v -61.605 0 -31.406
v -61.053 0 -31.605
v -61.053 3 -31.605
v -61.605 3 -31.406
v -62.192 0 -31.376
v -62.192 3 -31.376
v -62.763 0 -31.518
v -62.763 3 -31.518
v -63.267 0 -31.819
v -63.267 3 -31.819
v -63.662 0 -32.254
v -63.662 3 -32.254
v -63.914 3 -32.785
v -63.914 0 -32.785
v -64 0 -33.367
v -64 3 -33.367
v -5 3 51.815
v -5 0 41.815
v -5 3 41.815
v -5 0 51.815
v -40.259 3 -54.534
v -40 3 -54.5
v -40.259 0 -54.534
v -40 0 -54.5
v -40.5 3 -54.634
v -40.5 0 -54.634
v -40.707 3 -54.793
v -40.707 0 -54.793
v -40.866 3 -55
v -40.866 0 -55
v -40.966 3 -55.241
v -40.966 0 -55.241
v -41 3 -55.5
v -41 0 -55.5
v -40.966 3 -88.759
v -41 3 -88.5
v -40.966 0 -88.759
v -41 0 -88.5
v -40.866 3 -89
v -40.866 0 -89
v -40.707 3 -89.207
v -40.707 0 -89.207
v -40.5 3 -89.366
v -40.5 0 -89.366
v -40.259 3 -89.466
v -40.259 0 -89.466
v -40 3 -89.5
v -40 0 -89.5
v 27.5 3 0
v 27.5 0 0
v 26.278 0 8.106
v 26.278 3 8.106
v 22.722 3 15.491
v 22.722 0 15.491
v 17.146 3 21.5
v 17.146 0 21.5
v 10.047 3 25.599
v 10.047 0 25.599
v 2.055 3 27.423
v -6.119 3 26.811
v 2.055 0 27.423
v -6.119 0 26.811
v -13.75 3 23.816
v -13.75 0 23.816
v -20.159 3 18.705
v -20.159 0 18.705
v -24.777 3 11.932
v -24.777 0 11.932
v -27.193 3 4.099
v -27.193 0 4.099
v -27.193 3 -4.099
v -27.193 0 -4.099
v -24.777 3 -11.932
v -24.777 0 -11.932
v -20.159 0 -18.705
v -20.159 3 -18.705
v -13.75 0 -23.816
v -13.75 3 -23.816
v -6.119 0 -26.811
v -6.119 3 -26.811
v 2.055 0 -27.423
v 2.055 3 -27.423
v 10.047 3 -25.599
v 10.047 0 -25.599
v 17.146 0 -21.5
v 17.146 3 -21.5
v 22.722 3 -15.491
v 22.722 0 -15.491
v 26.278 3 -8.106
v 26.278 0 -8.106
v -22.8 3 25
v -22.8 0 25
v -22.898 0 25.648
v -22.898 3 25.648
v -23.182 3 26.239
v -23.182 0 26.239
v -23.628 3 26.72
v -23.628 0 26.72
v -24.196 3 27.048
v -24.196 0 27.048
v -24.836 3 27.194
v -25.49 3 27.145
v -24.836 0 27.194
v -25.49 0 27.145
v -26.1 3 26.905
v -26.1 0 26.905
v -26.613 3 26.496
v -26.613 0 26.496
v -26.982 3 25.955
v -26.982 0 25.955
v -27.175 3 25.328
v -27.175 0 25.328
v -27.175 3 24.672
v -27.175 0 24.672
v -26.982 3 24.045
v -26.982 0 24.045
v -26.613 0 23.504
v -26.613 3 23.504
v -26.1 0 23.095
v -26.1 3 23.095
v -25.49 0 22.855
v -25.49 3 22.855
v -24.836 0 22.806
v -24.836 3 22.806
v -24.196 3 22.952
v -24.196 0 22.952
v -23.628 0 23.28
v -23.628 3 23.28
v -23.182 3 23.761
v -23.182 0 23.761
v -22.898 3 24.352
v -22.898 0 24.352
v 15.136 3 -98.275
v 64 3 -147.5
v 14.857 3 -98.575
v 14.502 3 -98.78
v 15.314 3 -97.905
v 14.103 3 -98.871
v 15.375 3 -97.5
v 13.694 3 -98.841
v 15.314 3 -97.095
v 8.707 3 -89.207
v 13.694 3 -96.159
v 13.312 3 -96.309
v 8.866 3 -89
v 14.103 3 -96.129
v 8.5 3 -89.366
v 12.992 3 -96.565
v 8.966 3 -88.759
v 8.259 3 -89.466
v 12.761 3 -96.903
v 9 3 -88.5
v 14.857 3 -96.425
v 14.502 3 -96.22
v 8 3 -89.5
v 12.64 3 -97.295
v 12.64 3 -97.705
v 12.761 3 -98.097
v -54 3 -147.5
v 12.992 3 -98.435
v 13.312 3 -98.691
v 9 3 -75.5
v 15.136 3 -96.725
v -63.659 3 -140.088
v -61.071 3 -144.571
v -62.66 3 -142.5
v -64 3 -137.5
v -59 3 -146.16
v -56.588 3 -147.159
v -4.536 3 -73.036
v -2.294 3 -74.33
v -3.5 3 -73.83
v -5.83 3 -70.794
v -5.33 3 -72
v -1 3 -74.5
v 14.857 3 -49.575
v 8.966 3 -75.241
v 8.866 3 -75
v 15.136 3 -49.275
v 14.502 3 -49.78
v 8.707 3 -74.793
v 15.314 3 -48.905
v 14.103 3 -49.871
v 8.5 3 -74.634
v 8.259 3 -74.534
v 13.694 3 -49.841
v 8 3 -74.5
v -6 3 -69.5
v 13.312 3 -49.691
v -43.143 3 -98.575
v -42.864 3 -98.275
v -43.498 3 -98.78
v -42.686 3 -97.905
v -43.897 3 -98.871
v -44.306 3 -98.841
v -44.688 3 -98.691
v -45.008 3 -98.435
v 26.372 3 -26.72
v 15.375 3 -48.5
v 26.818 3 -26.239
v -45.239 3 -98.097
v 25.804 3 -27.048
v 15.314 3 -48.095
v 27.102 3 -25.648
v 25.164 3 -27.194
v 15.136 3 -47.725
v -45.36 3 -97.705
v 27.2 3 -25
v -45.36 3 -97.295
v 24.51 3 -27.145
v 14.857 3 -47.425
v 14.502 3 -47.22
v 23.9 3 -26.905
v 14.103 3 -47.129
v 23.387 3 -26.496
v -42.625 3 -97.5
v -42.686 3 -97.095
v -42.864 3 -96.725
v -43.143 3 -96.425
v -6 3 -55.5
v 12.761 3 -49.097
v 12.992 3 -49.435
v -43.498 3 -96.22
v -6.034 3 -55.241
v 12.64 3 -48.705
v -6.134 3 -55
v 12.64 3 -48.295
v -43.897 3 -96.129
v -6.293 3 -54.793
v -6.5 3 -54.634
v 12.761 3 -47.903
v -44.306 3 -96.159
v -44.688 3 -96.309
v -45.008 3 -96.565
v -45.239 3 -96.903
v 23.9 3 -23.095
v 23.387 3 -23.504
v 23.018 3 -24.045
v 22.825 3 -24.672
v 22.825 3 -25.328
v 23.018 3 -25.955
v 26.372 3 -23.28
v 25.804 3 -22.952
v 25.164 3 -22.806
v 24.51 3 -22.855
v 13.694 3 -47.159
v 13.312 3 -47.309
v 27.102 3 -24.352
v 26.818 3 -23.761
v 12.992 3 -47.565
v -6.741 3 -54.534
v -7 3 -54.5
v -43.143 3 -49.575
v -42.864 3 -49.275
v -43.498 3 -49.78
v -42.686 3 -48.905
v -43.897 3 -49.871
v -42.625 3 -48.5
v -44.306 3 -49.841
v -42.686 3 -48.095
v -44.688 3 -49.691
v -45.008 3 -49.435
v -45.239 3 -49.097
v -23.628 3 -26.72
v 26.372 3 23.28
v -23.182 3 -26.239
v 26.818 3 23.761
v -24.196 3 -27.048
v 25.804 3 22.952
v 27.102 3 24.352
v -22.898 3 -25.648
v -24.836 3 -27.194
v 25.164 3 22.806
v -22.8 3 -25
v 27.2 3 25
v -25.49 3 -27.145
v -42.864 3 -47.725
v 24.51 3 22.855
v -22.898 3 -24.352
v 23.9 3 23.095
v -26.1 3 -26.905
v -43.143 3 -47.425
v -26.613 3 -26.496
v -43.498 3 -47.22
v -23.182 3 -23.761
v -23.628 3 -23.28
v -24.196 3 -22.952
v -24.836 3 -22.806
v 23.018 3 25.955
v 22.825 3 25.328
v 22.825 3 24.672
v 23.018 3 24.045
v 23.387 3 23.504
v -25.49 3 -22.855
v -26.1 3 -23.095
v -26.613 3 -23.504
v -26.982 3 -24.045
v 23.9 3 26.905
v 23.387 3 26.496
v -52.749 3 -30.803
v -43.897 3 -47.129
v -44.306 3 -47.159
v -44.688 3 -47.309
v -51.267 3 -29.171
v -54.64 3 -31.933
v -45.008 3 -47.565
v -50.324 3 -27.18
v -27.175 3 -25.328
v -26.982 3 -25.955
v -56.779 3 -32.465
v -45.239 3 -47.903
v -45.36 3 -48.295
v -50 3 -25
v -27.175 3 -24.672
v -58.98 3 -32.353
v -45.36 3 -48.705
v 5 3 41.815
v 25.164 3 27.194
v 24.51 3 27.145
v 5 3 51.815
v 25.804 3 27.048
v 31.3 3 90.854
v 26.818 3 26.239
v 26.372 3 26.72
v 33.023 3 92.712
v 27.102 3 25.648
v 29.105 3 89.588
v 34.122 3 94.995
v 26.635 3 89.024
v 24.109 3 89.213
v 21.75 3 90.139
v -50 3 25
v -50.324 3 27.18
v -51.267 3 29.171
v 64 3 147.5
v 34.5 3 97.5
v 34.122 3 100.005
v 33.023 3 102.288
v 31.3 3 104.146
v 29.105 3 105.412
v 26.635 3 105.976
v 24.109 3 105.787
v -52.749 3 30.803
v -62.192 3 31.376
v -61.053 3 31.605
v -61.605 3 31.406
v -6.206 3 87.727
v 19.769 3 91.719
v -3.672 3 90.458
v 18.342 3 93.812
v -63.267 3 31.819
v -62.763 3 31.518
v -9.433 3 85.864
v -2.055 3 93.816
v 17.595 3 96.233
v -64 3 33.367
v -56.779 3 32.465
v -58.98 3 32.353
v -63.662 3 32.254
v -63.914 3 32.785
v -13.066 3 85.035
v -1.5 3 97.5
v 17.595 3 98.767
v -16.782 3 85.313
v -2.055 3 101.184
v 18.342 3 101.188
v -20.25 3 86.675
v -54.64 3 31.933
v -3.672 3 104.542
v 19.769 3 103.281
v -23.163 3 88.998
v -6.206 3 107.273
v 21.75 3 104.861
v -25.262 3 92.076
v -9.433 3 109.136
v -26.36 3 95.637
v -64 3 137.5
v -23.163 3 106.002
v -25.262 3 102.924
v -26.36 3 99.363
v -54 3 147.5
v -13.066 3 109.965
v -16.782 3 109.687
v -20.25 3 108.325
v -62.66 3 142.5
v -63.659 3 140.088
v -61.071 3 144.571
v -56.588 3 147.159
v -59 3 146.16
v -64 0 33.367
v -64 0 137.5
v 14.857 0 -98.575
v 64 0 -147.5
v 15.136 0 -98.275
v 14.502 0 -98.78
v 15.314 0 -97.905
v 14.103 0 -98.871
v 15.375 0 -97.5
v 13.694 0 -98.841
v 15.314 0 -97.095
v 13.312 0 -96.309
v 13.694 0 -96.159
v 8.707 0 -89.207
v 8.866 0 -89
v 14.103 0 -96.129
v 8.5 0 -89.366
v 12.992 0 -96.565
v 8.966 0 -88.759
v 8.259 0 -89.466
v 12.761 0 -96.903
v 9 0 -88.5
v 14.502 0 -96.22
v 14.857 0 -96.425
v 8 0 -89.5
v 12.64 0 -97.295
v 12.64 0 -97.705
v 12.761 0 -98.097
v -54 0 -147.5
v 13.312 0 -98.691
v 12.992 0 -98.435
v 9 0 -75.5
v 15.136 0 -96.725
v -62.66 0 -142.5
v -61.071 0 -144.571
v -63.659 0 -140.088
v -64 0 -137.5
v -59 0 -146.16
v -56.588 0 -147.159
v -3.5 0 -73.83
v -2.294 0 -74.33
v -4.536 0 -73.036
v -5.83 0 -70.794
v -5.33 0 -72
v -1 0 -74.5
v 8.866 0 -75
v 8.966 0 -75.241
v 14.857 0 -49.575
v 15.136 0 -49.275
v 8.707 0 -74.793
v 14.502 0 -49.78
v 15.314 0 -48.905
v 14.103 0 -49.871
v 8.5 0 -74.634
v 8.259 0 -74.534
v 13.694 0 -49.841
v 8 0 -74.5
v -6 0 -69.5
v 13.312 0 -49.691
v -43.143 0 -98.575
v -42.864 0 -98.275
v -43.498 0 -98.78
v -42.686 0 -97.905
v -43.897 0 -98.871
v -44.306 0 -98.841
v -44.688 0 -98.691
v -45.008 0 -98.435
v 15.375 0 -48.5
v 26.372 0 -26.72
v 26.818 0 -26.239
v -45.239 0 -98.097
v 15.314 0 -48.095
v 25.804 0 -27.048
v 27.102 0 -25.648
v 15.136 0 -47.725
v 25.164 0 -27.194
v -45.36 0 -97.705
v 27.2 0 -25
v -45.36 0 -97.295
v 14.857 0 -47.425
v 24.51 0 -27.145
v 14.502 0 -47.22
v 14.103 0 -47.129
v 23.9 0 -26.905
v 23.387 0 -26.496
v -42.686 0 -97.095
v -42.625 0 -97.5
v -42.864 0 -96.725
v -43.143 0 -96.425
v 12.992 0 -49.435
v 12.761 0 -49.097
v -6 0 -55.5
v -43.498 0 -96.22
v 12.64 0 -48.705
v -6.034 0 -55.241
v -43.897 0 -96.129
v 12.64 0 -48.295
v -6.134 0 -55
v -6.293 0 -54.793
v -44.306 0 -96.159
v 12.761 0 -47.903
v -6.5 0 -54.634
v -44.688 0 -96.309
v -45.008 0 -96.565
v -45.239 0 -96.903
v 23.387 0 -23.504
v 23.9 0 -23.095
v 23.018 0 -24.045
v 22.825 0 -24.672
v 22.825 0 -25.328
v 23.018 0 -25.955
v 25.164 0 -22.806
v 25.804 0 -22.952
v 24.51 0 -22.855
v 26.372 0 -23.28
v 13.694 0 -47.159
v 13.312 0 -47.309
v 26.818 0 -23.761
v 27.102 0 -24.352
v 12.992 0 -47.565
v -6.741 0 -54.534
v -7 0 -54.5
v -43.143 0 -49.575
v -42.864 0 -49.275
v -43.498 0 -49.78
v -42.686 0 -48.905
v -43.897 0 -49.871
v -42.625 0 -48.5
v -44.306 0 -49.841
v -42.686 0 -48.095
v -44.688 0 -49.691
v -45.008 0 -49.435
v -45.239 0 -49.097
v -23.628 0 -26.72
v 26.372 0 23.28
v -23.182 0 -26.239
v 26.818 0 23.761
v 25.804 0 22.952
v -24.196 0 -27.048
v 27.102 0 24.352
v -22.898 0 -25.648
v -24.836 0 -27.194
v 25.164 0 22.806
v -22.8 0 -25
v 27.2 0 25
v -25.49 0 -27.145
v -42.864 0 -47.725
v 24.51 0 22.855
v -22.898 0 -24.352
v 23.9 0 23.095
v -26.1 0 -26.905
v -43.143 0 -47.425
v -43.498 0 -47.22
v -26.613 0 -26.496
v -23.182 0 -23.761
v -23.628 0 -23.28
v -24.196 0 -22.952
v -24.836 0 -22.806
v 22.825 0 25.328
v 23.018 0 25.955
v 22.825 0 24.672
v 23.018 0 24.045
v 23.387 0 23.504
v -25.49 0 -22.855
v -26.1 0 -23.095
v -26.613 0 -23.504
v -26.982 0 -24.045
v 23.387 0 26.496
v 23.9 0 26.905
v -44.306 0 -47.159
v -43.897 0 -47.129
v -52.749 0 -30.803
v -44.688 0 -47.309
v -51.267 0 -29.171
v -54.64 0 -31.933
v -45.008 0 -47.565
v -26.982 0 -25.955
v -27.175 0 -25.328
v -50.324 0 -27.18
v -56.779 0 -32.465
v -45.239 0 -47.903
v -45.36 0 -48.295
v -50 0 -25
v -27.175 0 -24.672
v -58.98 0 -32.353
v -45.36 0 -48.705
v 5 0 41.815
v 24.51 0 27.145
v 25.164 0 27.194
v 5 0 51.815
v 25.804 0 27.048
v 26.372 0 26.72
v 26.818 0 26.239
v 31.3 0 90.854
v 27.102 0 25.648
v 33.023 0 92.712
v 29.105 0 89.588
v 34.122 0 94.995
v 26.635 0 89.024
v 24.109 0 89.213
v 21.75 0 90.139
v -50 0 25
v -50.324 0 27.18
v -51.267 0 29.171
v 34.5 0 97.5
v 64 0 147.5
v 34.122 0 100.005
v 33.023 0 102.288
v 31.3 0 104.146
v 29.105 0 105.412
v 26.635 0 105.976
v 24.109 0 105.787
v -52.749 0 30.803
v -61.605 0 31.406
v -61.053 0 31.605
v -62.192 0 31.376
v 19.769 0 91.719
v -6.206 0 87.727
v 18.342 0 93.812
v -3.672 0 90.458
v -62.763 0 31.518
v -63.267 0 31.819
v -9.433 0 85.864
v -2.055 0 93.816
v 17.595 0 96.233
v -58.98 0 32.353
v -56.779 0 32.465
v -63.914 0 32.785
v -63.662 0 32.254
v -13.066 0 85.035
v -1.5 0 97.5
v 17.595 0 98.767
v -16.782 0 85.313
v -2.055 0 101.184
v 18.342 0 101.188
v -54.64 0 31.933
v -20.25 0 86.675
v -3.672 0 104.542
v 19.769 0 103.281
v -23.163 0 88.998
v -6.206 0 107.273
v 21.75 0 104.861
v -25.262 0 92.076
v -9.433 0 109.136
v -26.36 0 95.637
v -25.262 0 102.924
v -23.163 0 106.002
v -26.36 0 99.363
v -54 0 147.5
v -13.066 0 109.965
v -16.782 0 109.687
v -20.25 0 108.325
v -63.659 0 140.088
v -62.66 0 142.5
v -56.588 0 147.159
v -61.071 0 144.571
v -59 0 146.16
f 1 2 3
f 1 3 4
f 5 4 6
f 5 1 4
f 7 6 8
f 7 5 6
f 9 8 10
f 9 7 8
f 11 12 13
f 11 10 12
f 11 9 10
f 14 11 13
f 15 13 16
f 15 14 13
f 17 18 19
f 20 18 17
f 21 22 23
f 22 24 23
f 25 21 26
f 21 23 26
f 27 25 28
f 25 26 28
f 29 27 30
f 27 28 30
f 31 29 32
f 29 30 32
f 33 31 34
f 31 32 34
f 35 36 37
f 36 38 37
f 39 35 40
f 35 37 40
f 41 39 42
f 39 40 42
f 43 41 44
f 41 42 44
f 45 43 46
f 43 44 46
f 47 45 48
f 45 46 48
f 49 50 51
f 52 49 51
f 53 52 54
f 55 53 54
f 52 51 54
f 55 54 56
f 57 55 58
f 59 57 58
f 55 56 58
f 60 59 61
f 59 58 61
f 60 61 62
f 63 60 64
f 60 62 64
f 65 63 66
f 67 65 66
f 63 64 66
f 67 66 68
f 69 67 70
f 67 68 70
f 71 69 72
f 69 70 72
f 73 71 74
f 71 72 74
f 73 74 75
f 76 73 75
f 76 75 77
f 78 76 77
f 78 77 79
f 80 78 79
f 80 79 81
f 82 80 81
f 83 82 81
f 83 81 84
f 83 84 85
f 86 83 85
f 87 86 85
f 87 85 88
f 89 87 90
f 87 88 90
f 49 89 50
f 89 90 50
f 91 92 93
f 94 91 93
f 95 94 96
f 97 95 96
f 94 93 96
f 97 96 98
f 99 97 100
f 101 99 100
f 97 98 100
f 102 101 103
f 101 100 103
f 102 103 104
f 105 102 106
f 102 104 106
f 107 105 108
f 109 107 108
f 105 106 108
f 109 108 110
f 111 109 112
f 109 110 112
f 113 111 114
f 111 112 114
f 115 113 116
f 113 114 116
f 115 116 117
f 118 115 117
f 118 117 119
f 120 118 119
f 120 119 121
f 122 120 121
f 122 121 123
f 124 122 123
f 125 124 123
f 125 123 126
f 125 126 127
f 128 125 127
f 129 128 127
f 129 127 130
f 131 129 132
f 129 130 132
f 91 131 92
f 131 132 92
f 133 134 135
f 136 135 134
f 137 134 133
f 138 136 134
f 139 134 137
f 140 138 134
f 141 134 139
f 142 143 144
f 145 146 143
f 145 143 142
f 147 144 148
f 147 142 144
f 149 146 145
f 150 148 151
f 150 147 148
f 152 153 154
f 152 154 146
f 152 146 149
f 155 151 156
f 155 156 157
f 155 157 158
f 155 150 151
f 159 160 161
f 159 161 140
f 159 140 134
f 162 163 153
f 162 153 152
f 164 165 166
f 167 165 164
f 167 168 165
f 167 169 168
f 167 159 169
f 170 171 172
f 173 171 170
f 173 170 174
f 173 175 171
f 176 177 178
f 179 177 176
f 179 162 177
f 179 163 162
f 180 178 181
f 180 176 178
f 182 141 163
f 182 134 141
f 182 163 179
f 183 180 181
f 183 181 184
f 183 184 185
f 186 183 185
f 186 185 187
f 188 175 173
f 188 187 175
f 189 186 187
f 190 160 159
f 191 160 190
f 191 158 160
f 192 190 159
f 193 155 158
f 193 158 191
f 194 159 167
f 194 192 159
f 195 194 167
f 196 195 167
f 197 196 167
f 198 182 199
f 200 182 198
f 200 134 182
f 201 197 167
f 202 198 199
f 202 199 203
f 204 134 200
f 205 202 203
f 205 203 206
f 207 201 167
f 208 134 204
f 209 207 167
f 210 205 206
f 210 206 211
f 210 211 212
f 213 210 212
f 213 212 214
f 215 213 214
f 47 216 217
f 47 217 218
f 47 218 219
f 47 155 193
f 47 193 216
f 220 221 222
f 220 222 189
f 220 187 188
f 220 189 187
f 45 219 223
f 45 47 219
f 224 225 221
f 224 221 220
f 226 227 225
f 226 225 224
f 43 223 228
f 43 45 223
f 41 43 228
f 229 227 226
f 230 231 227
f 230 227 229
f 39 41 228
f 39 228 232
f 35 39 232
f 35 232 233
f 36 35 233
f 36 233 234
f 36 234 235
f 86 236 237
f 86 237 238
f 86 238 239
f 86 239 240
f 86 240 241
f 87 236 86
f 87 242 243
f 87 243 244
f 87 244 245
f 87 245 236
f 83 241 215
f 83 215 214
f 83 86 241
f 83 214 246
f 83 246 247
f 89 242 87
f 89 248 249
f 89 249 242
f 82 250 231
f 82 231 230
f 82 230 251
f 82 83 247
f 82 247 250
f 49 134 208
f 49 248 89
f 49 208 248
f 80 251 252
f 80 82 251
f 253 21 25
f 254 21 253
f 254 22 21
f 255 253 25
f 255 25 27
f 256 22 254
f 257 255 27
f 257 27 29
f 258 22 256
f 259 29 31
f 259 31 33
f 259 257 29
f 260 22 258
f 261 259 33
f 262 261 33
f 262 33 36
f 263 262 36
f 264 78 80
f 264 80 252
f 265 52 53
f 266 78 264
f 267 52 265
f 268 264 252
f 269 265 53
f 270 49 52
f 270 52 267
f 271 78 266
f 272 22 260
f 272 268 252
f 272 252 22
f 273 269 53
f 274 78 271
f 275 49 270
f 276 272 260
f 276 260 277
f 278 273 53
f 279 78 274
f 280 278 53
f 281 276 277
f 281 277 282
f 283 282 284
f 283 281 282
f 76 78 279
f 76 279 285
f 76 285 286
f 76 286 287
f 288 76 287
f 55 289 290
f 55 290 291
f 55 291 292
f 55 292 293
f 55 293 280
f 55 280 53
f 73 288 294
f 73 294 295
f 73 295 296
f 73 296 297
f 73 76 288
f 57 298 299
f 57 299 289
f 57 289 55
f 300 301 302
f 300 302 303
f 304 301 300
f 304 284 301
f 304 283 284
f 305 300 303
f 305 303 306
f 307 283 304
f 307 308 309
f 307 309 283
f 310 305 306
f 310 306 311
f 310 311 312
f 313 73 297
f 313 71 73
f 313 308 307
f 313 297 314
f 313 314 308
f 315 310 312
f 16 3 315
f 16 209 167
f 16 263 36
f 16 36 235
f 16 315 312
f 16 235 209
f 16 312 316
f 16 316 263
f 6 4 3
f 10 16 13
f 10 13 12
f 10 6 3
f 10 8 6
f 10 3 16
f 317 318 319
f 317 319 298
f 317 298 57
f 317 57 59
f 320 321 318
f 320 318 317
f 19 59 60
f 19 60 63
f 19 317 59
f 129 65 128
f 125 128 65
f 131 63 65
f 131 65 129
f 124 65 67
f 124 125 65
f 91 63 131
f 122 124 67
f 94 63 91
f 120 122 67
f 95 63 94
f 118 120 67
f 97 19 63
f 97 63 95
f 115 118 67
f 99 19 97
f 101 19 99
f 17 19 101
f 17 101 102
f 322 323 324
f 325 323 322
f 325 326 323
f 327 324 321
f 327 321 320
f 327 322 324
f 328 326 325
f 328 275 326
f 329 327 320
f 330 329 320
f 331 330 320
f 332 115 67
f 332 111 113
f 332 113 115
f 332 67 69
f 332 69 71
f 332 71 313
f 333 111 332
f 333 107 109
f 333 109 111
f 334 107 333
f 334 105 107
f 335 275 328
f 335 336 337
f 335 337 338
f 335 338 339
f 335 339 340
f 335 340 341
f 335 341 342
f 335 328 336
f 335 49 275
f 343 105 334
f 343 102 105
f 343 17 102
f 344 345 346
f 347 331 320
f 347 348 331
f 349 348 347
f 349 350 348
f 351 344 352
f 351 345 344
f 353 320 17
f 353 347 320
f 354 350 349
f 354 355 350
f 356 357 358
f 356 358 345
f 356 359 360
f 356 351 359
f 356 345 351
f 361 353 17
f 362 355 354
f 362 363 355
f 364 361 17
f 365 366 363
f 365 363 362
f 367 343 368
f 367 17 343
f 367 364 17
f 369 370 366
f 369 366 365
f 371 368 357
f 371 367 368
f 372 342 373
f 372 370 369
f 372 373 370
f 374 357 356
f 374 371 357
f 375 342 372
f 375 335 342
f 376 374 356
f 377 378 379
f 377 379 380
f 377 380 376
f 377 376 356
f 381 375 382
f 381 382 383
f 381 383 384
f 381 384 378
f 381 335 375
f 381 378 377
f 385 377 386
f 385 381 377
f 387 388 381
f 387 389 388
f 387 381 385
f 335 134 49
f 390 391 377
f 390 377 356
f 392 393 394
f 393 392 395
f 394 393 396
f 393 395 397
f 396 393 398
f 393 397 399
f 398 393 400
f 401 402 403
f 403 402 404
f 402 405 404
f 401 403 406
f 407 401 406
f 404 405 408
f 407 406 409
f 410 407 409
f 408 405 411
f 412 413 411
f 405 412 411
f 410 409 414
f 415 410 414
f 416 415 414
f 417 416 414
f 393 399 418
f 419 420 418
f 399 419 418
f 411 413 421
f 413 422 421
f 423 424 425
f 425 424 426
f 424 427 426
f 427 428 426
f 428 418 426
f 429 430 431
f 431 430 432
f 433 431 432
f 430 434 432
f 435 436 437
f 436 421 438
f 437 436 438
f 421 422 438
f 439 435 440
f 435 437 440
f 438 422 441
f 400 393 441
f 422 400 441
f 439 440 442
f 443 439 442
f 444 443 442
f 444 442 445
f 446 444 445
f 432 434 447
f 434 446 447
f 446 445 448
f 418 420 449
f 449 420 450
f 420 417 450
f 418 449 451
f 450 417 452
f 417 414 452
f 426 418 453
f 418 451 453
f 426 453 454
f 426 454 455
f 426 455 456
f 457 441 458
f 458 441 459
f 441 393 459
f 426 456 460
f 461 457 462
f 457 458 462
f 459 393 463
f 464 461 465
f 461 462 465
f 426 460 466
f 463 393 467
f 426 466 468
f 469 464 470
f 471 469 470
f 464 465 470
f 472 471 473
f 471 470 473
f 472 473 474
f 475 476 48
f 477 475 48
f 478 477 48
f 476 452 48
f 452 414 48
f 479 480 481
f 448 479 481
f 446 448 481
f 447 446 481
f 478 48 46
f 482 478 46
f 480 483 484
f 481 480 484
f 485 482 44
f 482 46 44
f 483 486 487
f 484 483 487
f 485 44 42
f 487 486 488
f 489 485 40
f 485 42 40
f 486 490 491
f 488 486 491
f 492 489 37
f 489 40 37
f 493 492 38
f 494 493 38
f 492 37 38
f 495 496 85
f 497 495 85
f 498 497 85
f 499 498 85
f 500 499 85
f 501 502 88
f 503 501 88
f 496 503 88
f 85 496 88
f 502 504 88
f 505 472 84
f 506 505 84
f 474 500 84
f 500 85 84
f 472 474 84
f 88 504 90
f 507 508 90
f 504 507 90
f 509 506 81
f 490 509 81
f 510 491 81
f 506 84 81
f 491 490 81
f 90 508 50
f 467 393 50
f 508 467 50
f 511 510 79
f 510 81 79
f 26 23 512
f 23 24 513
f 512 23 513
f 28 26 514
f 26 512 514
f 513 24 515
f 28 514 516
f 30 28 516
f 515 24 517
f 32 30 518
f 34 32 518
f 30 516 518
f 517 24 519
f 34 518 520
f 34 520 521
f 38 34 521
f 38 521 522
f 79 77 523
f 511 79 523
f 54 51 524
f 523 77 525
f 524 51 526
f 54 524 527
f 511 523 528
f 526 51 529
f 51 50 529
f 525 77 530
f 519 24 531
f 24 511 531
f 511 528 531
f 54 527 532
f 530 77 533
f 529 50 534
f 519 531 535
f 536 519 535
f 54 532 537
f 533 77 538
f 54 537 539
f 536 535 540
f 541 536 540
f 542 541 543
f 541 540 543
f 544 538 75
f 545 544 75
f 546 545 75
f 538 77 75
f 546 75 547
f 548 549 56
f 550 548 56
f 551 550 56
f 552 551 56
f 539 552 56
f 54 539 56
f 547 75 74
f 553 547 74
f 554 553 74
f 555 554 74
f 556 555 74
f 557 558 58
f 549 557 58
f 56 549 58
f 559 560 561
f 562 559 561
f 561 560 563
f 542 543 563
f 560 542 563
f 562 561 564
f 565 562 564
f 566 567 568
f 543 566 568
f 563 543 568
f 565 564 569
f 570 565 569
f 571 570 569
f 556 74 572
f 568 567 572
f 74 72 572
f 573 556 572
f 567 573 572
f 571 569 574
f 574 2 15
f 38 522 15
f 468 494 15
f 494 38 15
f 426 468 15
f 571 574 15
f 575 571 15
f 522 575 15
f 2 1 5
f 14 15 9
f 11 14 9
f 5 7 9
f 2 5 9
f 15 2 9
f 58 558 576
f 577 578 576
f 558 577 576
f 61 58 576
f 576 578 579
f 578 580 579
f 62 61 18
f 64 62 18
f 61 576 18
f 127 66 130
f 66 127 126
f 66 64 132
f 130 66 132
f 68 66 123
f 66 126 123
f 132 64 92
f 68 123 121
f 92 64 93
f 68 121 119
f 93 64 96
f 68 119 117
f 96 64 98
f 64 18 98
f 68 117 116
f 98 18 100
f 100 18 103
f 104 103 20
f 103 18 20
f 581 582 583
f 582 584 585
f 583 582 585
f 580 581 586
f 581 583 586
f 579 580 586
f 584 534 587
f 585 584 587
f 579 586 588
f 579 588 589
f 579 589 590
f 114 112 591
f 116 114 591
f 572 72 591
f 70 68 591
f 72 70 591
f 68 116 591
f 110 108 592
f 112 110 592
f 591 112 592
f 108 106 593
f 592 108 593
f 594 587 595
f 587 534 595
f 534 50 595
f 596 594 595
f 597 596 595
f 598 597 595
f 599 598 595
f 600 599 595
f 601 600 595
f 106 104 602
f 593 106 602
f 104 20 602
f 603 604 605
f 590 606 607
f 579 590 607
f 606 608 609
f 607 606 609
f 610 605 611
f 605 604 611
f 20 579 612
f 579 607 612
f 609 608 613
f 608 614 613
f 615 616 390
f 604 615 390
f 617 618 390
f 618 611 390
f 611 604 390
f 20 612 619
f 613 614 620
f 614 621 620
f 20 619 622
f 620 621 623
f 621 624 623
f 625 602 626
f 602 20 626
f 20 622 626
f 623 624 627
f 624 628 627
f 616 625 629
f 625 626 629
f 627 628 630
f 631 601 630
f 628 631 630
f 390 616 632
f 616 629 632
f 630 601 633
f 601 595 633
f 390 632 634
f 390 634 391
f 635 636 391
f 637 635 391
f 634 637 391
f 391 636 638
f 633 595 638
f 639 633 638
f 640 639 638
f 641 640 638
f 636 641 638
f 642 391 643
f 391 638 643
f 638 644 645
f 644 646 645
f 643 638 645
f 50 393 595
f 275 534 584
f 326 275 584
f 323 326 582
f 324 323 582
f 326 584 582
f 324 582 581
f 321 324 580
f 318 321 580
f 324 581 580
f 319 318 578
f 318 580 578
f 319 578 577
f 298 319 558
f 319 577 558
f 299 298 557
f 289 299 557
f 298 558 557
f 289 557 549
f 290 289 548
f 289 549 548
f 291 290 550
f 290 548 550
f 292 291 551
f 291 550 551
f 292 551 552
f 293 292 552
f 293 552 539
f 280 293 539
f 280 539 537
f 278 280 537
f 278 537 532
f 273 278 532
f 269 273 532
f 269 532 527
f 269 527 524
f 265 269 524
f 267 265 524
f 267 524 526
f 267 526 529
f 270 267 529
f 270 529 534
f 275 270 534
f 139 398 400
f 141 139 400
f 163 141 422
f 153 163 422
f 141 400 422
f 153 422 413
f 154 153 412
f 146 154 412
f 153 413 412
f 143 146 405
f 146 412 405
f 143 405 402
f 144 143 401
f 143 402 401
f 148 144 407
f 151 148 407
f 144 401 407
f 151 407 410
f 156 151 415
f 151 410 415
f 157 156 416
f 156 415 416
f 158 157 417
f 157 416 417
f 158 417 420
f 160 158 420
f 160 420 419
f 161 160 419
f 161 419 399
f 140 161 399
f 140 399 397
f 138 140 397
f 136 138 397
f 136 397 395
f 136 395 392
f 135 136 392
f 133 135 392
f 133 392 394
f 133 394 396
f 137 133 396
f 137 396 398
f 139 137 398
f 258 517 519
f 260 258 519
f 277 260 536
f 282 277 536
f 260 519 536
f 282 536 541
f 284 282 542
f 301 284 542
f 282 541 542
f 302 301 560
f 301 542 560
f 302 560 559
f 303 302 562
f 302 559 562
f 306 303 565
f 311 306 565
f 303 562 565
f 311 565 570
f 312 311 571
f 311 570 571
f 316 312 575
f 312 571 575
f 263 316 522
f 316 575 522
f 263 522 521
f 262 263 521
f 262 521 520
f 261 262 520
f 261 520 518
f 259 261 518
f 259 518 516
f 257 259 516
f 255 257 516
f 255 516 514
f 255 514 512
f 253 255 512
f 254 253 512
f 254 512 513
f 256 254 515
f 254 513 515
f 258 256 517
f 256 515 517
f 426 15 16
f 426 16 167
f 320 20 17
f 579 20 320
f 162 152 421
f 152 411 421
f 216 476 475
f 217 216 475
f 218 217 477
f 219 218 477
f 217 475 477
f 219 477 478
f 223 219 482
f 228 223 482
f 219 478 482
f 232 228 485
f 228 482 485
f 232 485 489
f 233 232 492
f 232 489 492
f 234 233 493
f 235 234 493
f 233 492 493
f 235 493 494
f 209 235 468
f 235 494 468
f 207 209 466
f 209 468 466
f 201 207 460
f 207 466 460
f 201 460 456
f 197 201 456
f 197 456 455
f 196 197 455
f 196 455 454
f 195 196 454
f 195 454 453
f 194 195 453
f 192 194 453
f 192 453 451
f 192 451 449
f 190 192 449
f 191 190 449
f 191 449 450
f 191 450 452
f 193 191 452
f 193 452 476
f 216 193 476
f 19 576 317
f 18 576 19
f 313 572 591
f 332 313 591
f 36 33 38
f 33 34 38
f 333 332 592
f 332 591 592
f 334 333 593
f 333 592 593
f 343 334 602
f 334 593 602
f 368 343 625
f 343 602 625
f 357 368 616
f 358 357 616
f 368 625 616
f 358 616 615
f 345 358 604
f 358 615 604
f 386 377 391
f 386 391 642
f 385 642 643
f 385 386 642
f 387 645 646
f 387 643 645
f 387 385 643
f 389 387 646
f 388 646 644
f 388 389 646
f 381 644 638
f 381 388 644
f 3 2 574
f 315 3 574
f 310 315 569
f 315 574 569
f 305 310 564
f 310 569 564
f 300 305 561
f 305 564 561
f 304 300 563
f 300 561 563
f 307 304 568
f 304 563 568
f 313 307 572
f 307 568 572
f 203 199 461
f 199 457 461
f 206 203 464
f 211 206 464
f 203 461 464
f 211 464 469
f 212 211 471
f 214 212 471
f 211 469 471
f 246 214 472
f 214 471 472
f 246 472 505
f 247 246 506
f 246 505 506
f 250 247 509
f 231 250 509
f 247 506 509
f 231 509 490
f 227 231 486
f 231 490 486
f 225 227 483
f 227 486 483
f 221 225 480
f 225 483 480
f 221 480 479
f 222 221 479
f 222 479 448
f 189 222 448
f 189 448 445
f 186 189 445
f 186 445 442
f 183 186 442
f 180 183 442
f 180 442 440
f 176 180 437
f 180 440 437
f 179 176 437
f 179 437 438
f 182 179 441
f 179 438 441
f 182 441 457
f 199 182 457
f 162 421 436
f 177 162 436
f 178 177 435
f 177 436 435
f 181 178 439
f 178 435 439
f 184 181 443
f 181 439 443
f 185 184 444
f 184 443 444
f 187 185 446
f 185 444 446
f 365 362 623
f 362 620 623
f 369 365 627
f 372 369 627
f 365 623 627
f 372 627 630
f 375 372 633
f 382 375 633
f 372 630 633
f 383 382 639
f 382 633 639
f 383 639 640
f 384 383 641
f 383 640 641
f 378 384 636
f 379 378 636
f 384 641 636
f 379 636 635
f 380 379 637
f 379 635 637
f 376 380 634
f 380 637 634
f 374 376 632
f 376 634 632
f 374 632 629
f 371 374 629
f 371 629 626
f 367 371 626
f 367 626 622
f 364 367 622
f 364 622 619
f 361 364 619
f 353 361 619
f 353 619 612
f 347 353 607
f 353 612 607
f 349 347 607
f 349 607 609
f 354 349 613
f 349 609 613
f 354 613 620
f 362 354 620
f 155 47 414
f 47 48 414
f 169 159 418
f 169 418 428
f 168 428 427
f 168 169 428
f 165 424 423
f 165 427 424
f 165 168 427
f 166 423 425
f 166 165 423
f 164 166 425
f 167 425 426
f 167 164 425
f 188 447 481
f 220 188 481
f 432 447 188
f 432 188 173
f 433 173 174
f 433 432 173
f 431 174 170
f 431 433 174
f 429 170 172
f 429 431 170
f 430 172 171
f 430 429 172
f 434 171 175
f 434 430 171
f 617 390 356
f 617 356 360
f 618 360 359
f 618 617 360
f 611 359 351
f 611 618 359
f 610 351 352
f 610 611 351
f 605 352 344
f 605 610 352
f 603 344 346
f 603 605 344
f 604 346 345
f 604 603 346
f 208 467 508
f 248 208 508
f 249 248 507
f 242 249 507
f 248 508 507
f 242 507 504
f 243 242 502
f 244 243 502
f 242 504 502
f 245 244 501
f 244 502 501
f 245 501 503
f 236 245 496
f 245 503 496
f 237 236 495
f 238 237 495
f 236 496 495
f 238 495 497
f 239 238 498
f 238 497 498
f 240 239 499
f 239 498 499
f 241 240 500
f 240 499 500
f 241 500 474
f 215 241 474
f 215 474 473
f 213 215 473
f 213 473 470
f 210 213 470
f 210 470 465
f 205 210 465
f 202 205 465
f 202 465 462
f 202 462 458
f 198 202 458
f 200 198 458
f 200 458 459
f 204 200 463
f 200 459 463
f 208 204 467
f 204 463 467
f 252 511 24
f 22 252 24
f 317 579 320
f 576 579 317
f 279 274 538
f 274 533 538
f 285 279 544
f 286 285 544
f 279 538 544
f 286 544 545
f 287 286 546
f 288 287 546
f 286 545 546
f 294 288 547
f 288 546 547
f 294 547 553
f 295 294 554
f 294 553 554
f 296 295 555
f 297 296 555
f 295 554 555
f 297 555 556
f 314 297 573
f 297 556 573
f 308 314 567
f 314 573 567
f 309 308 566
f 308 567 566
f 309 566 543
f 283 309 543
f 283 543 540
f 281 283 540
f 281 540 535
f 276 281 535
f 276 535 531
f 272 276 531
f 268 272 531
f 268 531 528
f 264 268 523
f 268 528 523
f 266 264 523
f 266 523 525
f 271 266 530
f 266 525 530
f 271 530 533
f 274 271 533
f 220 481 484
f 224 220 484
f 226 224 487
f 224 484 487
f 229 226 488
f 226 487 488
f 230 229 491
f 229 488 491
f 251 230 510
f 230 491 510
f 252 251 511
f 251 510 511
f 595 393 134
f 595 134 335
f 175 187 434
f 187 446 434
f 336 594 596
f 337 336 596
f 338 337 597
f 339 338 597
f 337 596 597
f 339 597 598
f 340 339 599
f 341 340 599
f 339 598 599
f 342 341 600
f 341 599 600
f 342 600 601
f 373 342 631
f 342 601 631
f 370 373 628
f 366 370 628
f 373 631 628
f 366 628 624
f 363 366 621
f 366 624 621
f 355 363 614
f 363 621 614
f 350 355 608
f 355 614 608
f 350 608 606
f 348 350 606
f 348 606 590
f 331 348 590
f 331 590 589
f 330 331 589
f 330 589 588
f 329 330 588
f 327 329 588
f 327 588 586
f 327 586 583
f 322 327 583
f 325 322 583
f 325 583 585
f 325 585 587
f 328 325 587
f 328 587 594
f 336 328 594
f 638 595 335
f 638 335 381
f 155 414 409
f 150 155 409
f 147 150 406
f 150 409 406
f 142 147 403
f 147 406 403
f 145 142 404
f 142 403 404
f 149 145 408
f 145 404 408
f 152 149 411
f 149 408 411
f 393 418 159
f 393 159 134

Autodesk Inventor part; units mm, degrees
ref_plane "YZ Plane" through (0, 0, 0) normal (1, 0, 0) x (0, 1, 0)
ref_plane "XZ Plane" through (0, 0, 0) normal (0, 1, 0) x (-1, 0, 0)
ref_plane "XY Plane" through (0, 0, 0) normal (0, 0, 1) x (1, 0, 0)
sketch "Sketch1" plane through (0, 0, 0) normal (0, 1, 0) x (-1, 0, 0)
  line L0 (64, -147.5) -> (-64, -147.5)
  line L1 (-64, -147.5) -> (-64, 147.5)
  line L2 (-64, 147.5) -> (64, 147.5)
  line L3 (64, 147.5) -> (64, -147.5)
  line L4 (64, -147.5) -> (-64, 147.5) construction
  line L5 (-64, -147.5) -> (64, 147.5) construction
  point P0 (0, 0)
  dimension "d0" = 128
  dimension "d1" = 295
extrude "Extrusion1" add sketch "Sketch1" along normal blind 3
sketch "Sketch2" plane through (0, 0, 0) normal (0, -1, 0) x (1, 0, 0)
  line L0 (-57.5, 25) -> (-57.5, -25) construction
  line L1 (-65, 25) -> (-65, -25)
  line L2 (-50, -25) -> (-50, 25)
  arc A0 (-50, 25) -> (-65, 25) centre (-57.5, 25) ccw
  arc A1 (-65, -25) -> (-50, -25) centre (-57.5, -25) ccw
  line L3 (-57.5, 0) -> (-7.5, 0) construction
  point P0 (0, 0)
  dimension "d4" = 25
  dimension "d5" = 90
  dimension "d6" = 15
  dimension "d7" = 50
extrude "Extrusion2" cut sketch "Sketch2" against normal blind 3
sketch "Sketch3" plane through (0, 0, 0) normal (0, -1, 0) x (1, 0, 0)
  line L0 (30, -30) -> (-30, -30)
  line L1 (-30, -30) -> (-30, 30)
  line L2 (-30, 30) -> (30, 30)
  line L3 (30, 30) -> (30, -30)
  line L4 (30, -30) -> (-30, 30) construction
  line L5 (-30, -30) -> (30, 30) construction
  circle A0 centre (-25, -25) radius 2.2
  circle A1 centre (-25, 25) radius 2.2
  circle A2 centre (25, 25) radius 2.2
  circle A3 centre (25, -25) radius 2.2
  circle A4 centre (0, 0) radius 27.5
  dimension "d10" = 60
  dimension "d11" = 60
  dimension "d12" = 4.4
  dimension "d13" = 5
  dimension "d14" = 4.4
  dimension "d15" = 4.4
  dimension "d16" = 4.4
  dimension "d17" = 5
  dimension "d18" = 5
  dimension "d19" = 5
  dimension "d20" = 55
extrude "Extrusion3" cut sketch "Sketch3" against normal blind 3 contours A0 | A1 | A2 | A3 | A4
sketch "Sketch5" plane through (0, 0, 0) normal (0, -1, 0) x (1, 0, 0)
  circle A0 centre (14, -97.5) radius 1.375
  circle A1 centre (-44, -97.5) radius 1.375
  circle A2 centre (-44, -48.5) radius 1.375
  circle A3 centre (14, -48.5) radius 1.375
  line L0 (-64, 147.5) -> (-64, -147.5) projected
  line L1 (-64, -147.5) -> (64, -147.5) projected
  point P0 (0, 0)
  dimension "d23" = 2.75
  dimension "d24" = 2.75
  dimension "d25" = 2.75
  dimension "d26" = 2.75
  dimension "d27" = 58
  dimension "d28" = 58
  dimension "d29" = 49
  dimension "d30" = 20
  dimension "d31" = 50
  dimension "d32" = 50
  dimension "d33" = 20
  dimension "d36" = 49
extrude "Extrusion4" cut sketch "Sketch5" against normal blind 3
sketch "Sketch6" plane through (0, 0, 0) normal (0, -1, 0) x (1, 0, 0)
  line L0 (-40, -89.5) -> (-6, -89.5)
  line L1 (-6, -69.5) -> (-6, -55.5)
  line L2 (-7, -54.5) -> (-40, -54.5)
  line L3 (-41, -55.5) -> (-41, -88.5)
  circle A0 centre (-44, -97.5) radius 1.375 projected
  circle A1 centre (-44, -48.5) radius 1.375 projected
  line L4 (-6, -89.5) -> (8, -89.5)
  line L5 (9, -88.5) -> (9, -75.5)
  line L6 (8, -74.5) -> (-1, -74.5)
  line L7 (-6, -74.5) -> (-6, -89.5)
  arc A2 (-6, -69.5) -> (-1, -74.5) centre (-1, -69.5) ccw
  arc A3 (9, -75.5) -> (8, -74.5) centre (8, -75.5) ccw
  arc A4 (8, -89.5) -> (9, -88.5) centre (8, -88.5) ccw
  arc A5 (-41, -88.5) -> (-40, -89.5) centre (-40, -88.5) ccw
  arc A6 (-40, -54.5) -> (-41, -55.5) centre (-40, -55.5) ccw
  arc A7 (-6, -55.5) -> (-7, -54.5) centre (-7, -55.5) ccw
  point P0 (0, 0)
  point P1 (9, -74.5)
  point P2 (9, -89.5)
  dimension "d39" = 3
  dimension "d43" = 6
  dimension "d58" = 15
  dimension "d59" = 15
  dimension "d60" = 5
  dimension "d61" = 1
extrude "Extrusion5" cut sketch "Sketch6" against normal blind 3 contours A5 L3 A6 L2 A7 L1 A2 L6 A3 L5 A4 L4 L0
sketch "Sketch8" plane through (0, 0, 0) normal (0, -1, 0) x (1, 0, 0)
  circle A0 centre (-14, 97.5) radius 12.5
  line L0 (64, 147.5) -> (-64, 147.5) projected
  line L1 (-64, 147.5) -> (-64, 28.7417) projected
  circle A1 centre (26, 97.5) radius 8.5
  point P0 (0, 0)
  dimension "d44" = 25
  dimension "d45" = 50
  dimension "d46" = 50
  dimension "d49" = 17
  dimension "d50" = 50
  dimension "d51" = 40
extrude "Extrusion6" cut sketch "Sketch8" against normal blind 3
fillet "Fillet1" radius 2 2 edges at (-64, 1.5, 28.7417) (-64, 1.5, -28.7417)
sketch "Sketch9" plane through (0, 0, 0) normal (0, -1, 0) x (1, 0, 0)
  line L0 (-5, 51.815) -> (5, 51.815)
  line L1 (5, 51.815) -> (5, 41.815)
  line L2 (5, 41.815) -> (-5, 41.815)
  line L3 (-5, 41.815) -> (-5, 51.815)
  line L4 (-5, 51.815) -> (5, 41.815) construction
  line L5 (5, 51.815) -> (-5, 41.815) construction
  point P0 (0, 0)
  point P1 (0, 46.815)
  dimension "d53" = 10
  dimension "d54" = 10
  dimension "d55" = 0
extrude "Extrusion7" cut sketch "Sketch9" against normal blind 10
fillet "Fillet2" radius 10 2 edges at (-64, 1.5, 147.5) (-64, 1.5, -147.5)
properties part number "binnenplaat"
